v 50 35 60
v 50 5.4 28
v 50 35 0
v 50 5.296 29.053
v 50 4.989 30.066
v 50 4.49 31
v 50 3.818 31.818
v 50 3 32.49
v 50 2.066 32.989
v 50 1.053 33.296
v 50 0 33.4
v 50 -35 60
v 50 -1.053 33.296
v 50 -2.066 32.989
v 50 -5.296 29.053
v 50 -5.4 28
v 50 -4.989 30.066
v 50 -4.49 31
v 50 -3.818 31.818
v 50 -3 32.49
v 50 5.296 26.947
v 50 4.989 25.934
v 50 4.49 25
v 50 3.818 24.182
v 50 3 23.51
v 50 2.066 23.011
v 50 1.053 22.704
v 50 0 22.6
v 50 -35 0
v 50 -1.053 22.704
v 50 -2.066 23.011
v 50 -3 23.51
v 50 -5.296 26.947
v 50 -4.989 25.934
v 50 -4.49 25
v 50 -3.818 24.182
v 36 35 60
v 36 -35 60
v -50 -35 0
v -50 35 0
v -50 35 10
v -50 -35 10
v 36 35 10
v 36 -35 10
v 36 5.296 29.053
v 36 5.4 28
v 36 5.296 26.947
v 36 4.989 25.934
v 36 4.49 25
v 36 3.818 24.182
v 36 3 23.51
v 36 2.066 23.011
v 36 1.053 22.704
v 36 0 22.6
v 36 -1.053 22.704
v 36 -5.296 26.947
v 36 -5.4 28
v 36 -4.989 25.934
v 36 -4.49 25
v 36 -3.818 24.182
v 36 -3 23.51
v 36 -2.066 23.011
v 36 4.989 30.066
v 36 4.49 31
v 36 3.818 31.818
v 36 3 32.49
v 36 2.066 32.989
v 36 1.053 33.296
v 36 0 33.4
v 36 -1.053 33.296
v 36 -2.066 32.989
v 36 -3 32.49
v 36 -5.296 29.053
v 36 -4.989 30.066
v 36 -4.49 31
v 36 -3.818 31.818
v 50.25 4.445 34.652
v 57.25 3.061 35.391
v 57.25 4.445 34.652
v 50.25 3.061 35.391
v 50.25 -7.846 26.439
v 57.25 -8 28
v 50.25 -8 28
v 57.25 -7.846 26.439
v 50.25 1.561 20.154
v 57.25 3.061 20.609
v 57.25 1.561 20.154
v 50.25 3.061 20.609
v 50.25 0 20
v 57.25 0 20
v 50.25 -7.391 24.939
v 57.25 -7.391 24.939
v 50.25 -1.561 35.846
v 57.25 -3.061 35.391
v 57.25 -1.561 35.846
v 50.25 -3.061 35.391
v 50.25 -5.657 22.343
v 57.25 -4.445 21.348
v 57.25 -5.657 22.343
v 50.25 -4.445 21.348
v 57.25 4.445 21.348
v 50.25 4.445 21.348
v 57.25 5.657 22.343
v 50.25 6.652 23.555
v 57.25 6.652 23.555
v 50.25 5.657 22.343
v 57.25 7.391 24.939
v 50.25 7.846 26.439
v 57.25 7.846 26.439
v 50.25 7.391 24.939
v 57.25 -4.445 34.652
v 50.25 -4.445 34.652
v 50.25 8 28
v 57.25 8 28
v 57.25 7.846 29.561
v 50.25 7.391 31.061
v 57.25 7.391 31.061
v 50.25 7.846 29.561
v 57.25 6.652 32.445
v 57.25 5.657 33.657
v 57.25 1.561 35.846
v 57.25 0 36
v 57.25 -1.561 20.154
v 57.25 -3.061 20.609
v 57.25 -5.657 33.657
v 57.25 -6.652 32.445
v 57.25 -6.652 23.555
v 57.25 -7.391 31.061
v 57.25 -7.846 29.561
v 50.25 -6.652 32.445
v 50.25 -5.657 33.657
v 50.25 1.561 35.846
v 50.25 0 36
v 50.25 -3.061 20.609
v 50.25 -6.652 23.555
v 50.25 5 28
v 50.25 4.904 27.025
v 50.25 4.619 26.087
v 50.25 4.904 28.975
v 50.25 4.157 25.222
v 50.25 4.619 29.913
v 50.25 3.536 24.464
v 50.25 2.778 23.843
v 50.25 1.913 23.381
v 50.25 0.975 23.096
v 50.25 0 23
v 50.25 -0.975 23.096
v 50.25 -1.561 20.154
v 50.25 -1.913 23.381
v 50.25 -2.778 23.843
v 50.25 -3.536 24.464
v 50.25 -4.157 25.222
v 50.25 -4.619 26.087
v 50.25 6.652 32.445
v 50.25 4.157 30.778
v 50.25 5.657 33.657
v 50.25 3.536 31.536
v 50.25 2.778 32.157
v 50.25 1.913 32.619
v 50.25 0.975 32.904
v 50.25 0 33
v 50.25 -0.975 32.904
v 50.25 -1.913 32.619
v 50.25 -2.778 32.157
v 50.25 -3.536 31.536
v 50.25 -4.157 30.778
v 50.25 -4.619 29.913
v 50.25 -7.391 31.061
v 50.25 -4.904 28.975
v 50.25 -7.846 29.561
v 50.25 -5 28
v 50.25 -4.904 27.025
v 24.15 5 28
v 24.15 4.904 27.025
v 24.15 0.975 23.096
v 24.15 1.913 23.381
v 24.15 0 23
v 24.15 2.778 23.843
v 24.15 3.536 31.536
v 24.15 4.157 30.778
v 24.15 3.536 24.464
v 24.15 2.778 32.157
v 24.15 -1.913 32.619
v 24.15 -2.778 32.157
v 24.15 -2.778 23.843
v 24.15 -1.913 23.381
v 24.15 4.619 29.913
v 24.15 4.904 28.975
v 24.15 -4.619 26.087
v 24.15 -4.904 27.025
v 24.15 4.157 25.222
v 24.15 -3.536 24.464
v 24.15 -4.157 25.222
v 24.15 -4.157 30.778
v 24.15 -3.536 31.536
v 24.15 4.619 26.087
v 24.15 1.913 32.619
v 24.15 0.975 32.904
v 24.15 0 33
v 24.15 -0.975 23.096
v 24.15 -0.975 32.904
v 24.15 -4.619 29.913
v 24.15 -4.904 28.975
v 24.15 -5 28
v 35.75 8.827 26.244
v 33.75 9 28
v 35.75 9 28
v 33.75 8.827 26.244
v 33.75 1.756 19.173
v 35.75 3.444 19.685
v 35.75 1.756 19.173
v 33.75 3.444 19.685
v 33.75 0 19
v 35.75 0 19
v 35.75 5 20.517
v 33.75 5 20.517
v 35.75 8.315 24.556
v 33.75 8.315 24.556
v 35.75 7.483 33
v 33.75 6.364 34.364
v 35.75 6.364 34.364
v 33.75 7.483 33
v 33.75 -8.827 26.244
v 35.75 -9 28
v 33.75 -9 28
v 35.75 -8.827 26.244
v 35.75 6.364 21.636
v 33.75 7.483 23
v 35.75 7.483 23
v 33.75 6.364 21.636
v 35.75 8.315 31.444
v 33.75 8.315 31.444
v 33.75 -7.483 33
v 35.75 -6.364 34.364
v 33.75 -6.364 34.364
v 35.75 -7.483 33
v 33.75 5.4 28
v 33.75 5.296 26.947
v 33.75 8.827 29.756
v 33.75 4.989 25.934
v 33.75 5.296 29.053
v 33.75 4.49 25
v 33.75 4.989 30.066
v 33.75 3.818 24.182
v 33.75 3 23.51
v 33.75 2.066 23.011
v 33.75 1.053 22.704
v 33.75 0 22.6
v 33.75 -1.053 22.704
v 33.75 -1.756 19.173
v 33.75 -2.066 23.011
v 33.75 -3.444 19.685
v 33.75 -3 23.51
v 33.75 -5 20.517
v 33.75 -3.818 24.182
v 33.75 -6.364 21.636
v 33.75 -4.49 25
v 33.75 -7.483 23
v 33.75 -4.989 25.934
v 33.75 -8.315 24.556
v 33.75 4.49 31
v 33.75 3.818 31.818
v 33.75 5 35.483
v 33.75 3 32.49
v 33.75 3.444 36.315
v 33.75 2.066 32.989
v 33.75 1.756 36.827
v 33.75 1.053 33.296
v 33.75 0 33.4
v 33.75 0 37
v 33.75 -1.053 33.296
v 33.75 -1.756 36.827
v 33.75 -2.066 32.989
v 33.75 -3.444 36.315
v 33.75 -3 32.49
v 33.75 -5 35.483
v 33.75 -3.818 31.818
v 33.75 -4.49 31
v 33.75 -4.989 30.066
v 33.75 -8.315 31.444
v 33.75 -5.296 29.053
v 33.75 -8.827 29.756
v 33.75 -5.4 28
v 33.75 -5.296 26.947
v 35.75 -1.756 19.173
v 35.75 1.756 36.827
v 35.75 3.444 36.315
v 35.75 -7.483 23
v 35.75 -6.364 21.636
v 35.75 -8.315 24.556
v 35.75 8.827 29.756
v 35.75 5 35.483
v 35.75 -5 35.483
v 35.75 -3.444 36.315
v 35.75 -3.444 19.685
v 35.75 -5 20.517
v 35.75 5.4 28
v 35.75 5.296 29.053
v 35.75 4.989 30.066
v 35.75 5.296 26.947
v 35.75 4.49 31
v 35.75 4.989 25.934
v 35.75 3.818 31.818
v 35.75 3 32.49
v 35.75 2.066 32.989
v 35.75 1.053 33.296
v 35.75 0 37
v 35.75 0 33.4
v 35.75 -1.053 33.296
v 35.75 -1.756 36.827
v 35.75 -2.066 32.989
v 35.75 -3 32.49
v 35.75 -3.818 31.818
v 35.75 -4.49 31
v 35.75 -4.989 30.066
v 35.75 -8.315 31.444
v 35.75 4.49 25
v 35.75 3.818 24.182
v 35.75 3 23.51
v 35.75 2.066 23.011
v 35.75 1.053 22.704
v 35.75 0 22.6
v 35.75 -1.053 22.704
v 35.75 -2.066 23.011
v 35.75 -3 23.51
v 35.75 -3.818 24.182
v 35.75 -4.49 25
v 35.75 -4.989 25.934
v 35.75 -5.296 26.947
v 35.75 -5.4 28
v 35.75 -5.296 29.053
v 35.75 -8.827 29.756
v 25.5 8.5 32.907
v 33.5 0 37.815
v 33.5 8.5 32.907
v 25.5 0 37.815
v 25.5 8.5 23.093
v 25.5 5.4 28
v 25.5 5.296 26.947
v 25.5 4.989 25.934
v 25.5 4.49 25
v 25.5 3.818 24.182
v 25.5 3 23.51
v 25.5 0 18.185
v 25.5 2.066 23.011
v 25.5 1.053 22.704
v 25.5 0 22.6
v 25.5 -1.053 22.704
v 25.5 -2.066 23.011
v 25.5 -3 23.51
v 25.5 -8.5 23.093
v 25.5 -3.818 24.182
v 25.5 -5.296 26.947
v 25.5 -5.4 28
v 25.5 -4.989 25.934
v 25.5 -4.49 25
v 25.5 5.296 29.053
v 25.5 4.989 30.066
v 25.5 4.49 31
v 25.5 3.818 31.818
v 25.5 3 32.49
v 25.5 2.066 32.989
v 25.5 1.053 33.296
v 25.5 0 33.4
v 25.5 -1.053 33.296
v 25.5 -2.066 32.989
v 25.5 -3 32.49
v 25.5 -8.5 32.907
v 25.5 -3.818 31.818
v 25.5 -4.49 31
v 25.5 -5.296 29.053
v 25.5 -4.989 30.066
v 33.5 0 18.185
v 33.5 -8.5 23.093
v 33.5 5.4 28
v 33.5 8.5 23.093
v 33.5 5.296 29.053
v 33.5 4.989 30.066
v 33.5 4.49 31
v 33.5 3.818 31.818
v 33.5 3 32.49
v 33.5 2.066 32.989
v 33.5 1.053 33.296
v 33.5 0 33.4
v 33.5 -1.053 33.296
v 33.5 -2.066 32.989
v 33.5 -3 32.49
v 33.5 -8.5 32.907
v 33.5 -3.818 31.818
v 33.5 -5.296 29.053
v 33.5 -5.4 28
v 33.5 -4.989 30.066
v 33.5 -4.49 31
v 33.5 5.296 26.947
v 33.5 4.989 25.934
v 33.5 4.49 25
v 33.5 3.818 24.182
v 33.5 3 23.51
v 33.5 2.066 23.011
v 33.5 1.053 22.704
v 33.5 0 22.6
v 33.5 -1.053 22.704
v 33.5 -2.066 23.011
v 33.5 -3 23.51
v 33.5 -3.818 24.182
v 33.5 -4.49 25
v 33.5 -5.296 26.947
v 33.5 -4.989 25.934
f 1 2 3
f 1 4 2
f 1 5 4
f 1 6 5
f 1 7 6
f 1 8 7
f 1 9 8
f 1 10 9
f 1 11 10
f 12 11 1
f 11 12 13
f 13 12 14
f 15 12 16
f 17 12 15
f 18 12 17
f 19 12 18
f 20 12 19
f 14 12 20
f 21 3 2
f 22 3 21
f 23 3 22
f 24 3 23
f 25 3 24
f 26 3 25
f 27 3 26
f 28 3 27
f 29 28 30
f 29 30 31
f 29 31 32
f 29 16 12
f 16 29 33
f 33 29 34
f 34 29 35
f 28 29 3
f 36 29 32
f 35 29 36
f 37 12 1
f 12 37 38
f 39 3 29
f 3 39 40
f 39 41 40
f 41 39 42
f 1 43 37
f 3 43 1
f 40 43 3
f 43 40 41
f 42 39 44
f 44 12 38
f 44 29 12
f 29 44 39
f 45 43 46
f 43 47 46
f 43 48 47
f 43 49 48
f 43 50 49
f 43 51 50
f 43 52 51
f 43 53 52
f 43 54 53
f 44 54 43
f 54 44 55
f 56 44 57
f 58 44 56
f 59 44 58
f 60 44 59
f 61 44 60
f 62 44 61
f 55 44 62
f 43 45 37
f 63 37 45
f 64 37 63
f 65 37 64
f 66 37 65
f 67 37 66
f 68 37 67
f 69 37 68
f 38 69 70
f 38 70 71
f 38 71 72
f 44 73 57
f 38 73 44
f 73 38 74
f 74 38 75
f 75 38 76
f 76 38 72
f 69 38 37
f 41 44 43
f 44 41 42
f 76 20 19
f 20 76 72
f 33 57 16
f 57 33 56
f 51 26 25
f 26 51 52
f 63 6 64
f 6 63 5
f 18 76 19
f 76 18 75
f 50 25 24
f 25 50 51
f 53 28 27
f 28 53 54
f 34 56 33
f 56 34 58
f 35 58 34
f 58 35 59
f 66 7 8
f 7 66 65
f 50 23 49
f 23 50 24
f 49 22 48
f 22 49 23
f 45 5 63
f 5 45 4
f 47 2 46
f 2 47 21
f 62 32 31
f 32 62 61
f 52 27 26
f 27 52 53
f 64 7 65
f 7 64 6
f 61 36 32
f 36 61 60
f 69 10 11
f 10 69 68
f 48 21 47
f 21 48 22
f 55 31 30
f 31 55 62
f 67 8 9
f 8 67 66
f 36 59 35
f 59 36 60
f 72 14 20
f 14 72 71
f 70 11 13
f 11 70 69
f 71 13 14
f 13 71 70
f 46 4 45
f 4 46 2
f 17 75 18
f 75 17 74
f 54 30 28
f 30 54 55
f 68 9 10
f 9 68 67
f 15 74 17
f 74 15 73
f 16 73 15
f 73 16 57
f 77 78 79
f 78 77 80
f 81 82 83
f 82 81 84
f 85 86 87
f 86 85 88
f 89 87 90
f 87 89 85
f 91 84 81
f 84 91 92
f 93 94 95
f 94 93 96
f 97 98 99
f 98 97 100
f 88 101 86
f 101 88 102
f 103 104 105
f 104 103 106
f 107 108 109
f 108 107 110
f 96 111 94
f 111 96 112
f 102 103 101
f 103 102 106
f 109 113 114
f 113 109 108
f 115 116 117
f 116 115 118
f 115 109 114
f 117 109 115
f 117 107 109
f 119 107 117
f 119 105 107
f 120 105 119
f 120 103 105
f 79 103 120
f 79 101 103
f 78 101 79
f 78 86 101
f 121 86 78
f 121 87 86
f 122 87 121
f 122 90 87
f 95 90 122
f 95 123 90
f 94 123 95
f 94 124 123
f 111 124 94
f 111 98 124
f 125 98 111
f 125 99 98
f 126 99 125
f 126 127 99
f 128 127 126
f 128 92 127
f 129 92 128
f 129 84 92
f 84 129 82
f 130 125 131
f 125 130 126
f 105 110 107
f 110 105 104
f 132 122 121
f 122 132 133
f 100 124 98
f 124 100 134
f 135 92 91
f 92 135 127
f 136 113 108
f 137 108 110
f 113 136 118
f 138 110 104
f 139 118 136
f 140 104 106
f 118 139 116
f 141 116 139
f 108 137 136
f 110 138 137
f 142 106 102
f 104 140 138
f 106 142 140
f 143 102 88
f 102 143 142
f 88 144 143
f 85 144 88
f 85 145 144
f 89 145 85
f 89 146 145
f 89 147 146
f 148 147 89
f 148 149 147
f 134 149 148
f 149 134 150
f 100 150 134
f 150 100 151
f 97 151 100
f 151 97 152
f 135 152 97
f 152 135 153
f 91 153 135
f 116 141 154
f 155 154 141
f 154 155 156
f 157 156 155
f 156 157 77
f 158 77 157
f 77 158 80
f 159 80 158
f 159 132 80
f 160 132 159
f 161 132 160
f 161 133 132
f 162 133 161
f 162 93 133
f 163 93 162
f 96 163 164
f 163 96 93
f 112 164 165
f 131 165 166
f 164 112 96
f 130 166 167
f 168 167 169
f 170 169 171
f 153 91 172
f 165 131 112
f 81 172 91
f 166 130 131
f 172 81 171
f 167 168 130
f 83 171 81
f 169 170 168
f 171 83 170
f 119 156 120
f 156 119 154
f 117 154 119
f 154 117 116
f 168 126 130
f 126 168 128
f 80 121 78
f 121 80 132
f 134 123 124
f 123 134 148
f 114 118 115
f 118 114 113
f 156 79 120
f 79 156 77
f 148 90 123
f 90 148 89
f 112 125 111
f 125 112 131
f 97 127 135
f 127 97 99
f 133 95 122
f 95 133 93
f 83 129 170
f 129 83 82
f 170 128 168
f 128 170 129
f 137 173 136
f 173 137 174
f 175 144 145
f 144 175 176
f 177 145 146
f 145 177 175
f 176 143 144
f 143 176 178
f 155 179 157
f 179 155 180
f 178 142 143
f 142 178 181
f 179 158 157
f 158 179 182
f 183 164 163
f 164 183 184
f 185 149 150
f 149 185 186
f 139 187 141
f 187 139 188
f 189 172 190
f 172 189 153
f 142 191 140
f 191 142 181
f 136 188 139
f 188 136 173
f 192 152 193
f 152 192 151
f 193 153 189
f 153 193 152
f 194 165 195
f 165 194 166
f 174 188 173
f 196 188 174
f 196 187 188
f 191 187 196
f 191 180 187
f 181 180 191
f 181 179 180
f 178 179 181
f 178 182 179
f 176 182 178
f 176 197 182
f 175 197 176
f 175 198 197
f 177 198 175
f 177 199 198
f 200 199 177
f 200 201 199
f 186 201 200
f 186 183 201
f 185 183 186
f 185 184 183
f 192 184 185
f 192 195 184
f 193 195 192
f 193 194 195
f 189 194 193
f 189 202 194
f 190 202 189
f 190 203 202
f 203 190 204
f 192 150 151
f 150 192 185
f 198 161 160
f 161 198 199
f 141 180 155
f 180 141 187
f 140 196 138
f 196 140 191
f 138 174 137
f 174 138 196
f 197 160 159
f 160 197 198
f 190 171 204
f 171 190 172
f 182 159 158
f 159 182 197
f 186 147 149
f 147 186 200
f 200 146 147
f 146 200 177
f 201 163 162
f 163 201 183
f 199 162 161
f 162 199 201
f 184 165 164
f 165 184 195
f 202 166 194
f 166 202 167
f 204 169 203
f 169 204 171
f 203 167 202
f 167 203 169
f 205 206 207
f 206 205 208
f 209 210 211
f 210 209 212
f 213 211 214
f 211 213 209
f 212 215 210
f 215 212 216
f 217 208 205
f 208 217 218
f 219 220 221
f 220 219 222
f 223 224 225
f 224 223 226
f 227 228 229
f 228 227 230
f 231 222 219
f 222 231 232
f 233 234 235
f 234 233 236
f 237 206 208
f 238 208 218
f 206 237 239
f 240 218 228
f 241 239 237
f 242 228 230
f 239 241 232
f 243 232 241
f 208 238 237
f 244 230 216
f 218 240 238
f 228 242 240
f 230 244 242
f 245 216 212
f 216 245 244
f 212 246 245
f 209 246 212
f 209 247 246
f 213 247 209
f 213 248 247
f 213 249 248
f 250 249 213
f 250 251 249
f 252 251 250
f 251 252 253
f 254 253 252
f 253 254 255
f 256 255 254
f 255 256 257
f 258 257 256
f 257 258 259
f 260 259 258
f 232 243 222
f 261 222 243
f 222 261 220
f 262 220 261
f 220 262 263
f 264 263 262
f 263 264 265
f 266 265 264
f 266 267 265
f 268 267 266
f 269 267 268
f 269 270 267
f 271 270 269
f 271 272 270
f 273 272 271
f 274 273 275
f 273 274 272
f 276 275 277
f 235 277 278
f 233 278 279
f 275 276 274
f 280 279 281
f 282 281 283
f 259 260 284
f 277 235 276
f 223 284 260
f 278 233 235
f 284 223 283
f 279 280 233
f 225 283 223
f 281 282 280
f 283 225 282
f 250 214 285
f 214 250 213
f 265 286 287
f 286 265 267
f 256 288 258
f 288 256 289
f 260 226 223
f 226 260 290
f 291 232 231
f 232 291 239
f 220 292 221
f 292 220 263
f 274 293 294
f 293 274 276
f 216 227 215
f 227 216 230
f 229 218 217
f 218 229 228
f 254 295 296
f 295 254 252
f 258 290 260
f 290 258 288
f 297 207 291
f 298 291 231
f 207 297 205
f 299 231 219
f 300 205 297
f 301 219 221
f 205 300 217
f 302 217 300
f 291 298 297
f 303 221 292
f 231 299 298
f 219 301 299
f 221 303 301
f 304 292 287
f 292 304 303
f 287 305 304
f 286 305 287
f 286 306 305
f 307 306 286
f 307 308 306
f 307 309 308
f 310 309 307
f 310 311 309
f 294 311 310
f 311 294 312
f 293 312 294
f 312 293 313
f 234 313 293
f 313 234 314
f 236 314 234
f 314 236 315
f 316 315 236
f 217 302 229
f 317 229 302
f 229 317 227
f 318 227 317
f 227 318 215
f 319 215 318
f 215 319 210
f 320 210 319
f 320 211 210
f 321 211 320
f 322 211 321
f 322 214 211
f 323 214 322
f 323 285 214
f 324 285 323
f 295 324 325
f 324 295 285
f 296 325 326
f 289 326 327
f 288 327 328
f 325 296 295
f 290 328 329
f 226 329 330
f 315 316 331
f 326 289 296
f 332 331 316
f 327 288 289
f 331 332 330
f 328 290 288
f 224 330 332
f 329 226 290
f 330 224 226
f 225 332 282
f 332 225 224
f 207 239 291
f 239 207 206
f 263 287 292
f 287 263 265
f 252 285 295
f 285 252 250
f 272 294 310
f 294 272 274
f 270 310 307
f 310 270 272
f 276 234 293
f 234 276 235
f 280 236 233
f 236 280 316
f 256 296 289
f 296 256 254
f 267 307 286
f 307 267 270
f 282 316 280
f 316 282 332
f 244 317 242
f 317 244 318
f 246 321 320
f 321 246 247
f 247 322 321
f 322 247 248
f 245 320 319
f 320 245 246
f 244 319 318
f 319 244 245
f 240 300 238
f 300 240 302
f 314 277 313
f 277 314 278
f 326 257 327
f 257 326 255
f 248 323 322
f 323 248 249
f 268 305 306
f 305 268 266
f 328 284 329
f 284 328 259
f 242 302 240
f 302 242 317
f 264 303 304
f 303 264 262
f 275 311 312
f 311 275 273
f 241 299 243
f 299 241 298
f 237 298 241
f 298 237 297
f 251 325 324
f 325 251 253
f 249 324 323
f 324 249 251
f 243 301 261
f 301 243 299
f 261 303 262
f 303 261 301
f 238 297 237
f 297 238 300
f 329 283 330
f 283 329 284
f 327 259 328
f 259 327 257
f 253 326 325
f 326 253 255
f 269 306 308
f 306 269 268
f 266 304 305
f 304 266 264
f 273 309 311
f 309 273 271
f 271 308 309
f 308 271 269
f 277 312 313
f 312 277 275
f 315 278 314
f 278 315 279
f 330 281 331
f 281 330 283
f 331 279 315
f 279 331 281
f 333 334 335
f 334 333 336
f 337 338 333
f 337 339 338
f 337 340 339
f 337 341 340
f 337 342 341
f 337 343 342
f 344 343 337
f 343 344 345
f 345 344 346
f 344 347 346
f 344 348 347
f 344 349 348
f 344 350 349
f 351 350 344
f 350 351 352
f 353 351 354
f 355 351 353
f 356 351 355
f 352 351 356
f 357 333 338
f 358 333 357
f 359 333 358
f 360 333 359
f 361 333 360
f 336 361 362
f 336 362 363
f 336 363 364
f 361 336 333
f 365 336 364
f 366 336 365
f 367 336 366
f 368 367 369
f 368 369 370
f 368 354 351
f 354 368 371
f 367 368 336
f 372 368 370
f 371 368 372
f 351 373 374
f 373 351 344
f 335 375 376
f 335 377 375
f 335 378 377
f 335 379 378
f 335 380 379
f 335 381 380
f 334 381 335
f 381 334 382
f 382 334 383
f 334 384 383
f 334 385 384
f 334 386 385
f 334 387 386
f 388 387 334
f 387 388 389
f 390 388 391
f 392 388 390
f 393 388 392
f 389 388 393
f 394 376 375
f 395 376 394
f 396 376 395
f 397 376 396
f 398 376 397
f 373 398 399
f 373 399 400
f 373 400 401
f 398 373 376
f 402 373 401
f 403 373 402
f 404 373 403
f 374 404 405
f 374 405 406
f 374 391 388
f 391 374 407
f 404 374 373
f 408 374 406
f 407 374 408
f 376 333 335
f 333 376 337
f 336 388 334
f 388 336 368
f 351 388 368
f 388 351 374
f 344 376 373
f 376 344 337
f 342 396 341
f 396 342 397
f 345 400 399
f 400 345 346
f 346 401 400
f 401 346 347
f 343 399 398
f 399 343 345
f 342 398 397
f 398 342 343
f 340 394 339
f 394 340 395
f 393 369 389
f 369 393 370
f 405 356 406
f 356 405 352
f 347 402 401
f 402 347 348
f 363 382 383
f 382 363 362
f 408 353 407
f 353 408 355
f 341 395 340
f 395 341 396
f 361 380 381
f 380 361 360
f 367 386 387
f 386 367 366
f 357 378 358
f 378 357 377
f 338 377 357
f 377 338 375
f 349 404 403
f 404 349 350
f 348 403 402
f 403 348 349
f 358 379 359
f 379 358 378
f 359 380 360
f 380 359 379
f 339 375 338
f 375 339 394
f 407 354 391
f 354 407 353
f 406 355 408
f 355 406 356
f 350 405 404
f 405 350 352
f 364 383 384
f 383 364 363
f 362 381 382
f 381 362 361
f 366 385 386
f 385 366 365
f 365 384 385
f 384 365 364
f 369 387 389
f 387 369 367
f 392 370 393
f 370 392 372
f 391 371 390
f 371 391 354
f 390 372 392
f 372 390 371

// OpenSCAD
$fn = 32;

// ------------------------------------------------------------------------
// Bolted bracket: 100 x 70 mm bracket with 1 bolt joints
// Every part is its own module, assembly() places them once.
// ------------------------------------------------------------------------

// --- part 1 ---
module bracket() {
  difference() {
    translate([-50, -35, 0]) cube([100, 70, 60]);
    translate([-51, -36, 10]) cube([87, 72, 51]);
    translate([43, 0, 28]) rotate([0, 90, 0]) cylinder(h = 16, d = 10.8, center = true);
  }
}

// --- part 2 ---
module bolt() {
  cylinder(h = 7, d = 16);
  translate([0, 0, -26.1]) cylinder(h = 26.1, d = 10);
}

// --- part 3 ---
module washer() {
  difference() {
      translate([0, 0, 0]) cylinder(h = 2, d = 18);
      translate([0, 0, -1]) cylinder(h = 4, d = 10.8);
    }
}

// --- part 4 ---
module nut() {
  difference() {
    linear_extrude(height = 8) polygon(points = [[9.815, 0], [4.907, 8.5], [-4.907, 8.5], [-9.815, 0], [-4.907, -8.5], [4.907, -8.5]]);
    translate([0, 0, -1]) cylinder(h = 10, d = 10.8);
  }
}

// --- assembly ---
module assembly() {
  translate([0, 0, 0]) rotate([0, 0, 0]) bracket();
  translate([50.25, 0, 28]) rotate([0, 90, 0]) bolt();
  translate([33.75, 0, 28]) rotate([0, 90, 0]) washer();
  translate([25.5, 0, 28]) rotate([0, 90, 0]) nut();
}

assembly();
